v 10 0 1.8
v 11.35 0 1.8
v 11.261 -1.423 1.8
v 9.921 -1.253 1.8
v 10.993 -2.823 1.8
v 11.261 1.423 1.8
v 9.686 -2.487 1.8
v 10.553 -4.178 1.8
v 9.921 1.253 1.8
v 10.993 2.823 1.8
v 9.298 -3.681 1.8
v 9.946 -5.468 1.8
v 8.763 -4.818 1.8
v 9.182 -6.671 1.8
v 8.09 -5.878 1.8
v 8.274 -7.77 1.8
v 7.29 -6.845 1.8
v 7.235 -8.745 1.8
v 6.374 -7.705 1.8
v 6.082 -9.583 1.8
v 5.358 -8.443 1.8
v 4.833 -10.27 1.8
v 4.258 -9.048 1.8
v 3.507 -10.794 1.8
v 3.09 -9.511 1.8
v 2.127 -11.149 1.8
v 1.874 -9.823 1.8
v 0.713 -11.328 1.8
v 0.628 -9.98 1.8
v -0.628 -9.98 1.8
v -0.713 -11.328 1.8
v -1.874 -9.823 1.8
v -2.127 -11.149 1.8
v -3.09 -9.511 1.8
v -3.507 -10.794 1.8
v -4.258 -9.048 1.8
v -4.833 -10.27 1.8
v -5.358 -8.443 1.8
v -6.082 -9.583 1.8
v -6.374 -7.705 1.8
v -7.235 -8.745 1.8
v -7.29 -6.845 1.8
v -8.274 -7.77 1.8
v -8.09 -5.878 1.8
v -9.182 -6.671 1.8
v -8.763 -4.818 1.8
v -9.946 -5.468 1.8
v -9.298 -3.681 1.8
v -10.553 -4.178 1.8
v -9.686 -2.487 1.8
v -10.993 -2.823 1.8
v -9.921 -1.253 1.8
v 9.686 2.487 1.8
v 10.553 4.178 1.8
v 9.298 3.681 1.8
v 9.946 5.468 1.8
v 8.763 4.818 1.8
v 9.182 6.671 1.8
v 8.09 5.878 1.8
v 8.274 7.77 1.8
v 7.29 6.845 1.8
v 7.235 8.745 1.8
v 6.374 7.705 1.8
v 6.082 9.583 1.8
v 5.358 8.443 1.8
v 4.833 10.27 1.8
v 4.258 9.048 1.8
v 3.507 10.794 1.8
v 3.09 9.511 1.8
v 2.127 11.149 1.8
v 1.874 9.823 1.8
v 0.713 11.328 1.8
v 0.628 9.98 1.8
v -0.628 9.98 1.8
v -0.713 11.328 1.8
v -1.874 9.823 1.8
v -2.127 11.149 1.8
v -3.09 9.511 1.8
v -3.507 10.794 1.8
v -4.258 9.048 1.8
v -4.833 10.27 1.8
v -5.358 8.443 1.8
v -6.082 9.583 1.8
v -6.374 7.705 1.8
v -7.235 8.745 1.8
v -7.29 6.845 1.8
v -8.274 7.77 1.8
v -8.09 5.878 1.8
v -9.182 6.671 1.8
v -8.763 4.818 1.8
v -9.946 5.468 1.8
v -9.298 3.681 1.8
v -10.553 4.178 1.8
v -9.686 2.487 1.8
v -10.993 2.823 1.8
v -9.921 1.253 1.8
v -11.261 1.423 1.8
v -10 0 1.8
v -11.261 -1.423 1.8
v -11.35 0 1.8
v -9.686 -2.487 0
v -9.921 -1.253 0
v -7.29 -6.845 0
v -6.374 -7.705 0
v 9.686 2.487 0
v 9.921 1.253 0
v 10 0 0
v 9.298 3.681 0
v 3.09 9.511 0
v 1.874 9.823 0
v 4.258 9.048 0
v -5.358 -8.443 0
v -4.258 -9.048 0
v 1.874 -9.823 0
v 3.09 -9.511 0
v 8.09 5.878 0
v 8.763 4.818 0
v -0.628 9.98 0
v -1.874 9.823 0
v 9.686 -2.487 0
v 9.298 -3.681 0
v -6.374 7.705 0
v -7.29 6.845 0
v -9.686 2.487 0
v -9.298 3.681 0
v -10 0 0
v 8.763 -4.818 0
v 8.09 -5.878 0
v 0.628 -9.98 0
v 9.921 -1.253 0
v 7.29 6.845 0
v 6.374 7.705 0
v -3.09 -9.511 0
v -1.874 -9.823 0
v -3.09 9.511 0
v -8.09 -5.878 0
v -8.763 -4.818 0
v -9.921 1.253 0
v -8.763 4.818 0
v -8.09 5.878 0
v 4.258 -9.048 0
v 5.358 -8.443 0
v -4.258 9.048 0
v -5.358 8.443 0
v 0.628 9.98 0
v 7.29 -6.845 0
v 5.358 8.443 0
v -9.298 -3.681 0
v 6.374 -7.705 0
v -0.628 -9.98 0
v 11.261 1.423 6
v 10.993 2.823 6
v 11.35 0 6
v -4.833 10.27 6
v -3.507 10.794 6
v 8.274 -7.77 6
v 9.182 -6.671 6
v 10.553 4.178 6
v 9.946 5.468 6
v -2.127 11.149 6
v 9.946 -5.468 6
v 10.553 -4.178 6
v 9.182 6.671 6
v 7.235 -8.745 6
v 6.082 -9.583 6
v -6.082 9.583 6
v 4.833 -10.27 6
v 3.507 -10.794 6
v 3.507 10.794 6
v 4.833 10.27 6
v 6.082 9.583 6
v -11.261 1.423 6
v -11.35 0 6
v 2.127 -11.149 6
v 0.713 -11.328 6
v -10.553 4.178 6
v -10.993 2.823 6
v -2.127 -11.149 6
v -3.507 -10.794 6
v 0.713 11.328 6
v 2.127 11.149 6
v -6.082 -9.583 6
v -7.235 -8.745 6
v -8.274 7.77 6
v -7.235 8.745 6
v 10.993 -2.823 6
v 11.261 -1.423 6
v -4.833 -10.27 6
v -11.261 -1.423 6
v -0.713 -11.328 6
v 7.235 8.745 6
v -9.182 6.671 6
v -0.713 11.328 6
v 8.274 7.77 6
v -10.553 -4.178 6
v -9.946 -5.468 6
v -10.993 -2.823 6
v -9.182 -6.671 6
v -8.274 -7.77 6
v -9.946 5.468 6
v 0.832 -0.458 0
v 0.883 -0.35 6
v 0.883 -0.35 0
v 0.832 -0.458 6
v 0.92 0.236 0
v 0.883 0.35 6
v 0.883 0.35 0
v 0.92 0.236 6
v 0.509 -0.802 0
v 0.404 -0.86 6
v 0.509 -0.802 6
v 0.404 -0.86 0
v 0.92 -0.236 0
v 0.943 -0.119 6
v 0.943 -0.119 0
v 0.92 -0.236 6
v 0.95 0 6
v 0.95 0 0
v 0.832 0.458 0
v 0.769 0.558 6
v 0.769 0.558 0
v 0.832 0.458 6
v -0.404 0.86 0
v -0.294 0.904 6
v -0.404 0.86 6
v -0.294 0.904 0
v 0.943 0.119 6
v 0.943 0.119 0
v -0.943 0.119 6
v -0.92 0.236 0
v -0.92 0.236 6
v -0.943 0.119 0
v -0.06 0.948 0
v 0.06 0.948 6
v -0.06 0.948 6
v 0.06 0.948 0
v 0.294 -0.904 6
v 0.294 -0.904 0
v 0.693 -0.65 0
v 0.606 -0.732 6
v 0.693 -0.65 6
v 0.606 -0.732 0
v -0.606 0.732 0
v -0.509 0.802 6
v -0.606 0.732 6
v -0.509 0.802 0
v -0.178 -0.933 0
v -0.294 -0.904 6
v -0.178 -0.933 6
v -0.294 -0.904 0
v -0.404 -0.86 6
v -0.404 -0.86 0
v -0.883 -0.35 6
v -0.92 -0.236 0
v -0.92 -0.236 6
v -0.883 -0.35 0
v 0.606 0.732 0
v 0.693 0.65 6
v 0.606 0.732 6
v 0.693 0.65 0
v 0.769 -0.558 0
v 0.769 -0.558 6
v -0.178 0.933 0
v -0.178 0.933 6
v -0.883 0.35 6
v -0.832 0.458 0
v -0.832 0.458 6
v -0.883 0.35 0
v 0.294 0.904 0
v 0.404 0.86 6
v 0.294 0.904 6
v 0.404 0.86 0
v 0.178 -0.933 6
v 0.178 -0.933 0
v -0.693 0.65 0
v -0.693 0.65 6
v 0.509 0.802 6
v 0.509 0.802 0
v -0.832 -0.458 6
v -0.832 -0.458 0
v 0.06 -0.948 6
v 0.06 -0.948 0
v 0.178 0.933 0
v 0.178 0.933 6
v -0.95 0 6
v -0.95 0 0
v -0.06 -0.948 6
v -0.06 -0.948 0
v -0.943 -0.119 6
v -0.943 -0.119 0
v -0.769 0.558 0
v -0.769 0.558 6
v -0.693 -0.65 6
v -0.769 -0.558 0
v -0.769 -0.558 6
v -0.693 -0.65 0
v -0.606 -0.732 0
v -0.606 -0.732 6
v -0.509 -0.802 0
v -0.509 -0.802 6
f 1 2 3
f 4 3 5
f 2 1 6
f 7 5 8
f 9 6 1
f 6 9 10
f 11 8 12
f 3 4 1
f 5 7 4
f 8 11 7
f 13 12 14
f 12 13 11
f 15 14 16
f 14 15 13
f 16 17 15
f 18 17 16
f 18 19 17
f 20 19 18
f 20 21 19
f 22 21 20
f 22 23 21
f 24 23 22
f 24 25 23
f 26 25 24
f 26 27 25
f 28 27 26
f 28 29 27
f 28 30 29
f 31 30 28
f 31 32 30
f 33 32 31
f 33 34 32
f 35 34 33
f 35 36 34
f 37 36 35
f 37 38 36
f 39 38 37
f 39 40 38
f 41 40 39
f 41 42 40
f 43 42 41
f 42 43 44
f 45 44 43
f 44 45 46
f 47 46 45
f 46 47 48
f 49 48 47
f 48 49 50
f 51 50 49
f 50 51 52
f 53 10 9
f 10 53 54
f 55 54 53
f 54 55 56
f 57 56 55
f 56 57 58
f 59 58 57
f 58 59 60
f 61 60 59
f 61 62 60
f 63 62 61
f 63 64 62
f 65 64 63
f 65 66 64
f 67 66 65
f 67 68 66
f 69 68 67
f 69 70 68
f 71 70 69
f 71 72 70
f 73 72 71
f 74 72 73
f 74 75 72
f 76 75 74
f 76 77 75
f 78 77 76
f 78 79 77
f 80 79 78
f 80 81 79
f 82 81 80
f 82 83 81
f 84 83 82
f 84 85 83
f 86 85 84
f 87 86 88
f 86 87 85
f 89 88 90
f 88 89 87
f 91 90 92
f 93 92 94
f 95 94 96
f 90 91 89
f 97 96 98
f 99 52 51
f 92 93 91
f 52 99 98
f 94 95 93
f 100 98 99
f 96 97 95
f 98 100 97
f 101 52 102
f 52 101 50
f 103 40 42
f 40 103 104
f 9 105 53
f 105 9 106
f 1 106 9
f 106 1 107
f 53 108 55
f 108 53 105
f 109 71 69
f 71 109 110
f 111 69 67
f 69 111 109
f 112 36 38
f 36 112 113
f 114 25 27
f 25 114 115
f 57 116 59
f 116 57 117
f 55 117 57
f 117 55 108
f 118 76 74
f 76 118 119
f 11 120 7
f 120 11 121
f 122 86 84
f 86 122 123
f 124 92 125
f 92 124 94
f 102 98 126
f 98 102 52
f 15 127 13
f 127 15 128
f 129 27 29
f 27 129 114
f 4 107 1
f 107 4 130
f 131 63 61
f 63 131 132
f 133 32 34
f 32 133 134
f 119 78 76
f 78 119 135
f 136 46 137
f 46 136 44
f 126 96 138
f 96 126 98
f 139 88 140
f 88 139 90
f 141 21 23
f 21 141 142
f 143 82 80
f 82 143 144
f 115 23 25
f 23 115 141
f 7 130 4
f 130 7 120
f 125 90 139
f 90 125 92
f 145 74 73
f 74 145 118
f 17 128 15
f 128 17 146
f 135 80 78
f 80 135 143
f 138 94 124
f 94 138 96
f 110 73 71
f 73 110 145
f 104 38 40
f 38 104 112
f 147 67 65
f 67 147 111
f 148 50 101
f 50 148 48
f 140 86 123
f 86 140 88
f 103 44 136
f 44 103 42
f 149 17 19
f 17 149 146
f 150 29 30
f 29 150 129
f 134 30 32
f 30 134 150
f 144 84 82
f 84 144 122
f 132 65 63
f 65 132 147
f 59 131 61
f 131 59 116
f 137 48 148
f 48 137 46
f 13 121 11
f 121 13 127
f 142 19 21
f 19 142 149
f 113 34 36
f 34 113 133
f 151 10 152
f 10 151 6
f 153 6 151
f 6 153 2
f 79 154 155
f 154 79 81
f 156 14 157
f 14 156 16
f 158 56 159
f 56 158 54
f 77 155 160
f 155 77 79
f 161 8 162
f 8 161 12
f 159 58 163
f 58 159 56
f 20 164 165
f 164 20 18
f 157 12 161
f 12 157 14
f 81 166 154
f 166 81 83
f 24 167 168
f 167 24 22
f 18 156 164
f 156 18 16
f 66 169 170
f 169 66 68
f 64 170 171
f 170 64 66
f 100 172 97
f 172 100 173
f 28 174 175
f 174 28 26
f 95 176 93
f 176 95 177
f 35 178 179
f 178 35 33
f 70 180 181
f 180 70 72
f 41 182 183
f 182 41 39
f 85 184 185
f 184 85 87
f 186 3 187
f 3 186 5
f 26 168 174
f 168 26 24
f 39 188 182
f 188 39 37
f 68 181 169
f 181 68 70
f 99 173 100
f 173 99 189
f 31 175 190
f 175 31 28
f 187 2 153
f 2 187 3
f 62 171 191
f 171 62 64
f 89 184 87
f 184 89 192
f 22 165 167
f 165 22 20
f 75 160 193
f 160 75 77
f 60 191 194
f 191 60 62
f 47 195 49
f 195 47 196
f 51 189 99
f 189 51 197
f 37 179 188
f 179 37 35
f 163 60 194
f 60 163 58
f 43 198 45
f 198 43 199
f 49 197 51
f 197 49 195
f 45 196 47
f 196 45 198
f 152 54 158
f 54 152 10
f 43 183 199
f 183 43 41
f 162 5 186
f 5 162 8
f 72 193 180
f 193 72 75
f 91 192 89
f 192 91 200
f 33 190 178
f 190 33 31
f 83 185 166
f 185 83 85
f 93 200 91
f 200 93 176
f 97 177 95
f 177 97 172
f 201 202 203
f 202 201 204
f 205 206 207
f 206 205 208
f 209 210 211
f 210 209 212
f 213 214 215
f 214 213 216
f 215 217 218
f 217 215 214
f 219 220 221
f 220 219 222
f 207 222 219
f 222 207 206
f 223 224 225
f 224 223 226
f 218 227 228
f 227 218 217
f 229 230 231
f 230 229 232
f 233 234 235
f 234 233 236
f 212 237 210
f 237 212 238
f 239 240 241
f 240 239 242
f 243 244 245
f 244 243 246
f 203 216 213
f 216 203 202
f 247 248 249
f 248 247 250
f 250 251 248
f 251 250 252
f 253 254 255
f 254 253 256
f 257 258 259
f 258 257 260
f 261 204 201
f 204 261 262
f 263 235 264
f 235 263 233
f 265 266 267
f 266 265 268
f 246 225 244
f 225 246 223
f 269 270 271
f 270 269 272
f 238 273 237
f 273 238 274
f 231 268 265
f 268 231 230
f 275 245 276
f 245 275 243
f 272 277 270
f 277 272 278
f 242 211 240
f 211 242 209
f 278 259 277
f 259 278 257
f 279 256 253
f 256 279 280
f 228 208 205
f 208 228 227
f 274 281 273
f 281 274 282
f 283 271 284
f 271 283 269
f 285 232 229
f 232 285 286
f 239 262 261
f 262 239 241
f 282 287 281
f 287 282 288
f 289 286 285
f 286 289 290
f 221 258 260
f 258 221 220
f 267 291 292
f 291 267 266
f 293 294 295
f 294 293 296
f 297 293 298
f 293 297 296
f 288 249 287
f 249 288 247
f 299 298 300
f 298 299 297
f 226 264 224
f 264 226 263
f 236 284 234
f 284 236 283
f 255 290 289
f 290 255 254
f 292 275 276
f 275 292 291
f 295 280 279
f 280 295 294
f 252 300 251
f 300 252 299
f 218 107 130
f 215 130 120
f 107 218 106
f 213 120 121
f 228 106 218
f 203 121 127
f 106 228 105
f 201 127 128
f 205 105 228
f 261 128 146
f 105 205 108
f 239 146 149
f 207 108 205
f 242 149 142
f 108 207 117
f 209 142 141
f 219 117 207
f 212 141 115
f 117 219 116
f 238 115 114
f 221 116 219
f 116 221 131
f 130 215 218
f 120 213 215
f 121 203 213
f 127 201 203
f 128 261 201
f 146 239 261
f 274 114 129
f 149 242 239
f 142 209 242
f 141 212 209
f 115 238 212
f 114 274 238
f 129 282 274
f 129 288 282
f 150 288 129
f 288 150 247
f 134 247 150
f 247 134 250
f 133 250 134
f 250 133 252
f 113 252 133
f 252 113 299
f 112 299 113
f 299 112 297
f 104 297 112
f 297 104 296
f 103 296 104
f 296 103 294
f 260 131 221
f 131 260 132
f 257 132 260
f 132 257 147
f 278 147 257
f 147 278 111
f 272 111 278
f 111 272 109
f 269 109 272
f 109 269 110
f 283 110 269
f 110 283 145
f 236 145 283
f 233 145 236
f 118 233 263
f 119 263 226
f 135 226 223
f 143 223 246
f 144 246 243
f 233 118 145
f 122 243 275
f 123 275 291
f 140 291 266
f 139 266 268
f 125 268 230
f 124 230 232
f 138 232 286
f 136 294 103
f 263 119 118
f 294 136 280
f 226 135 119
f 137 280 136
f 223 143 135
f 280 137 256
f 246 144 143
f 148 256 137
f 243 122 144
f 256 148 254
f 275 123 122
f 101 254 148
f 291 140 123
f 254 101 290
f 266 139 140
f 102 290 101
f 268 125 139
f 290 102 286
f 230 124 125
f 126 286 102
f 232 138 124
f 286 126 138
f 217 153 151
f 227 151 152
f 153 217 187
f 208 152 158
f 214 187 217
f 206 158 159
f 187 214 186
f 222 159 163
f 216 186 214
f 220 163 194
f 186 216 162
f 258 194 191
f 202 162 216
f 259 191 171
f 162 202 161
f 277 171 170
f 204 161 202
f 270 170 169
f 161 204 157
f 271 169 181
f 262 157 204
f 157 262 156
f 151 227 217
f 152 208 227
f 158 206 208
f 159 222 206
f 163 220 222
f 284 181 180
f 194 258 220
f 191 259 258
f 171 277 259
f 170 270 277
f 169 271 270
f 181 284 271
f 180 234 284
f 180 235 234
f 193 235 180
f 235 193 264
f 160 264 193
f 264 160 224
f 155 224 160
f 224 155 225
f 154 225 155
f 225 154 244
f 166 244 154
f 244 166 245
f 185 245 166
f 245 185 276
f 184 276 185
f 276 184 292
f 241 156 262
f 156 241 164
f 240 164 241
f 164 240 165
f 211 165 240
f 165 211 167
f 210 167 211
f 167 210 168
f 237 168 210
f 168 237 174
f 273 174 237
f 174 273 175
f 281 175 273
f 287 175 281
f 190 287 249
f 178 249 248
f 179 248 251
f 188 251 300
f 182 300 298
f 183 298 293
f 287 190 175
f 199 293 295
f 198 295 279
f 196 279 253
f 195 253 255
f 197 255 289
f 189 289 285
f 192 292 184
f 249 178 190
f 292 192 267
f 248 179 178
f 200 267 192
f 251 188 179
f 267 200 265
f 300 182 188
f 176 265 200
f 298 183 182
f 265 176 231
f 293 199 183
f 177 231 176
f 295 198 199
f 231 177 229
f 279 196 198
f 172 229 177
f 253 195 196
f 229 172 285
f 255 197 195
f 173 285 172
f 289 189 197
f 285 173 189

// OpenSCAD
$fn = 50;


difference() {
	union() {
		*color(alpha = 1.0000000000, c = "gray") {
			translate(v = [0, 7, 0]) {
				linear_extrude(height = 12) {
					text(font = "Arial:style=Bold", halign = "center", size = 4.5000000000, text = "COMMENT bearing_plate_plate", valign = "center");
				}
			}
		}
		*color(alpha = 1.0000000000, c = "gray") {
			translate(v = [0, 14, 0]) {
				linear_extrude(height = 12) {
					text(font = "Arial:style=Bold", halign = "center", size = 4.5000000000, text = "COMMENT description oobb_cylinder_shape_p_type_12_depth_3_width_12_height_12_thickness_motor_n20_shaft_p_t_12.0_radius_all_mode", valign = "center");
				}
			}
		}
		translate(v = [0, 0, -6.0000000000]) {
			cylinder(h = 12, r = 12.0000000000);
		}
		*color(alpha = 1.0000000000, c = "gray") {
			translate(v = [0, 7, 0]) {
				linear_extrude(height = 1) {
					text(font = "Arial:style=Bold", halign = "center", size = 4.5000000000, text = "COMMENT bearing_plate_slice", valign = "center");
				}
			}
		}
	}
	union() {
		translate(v = [18.0000000000, 0, -6.0000000000]) {
			rotate(a = [0, 180, 30.0000000000]) {
				difference() {
					union() {
						translate(v = [0, 0, -12.0000000000]) {
							cylinder(h = 12, r = 1.5000000000);
						}
						translate(v = [0, 0, -12.0000000000]) {
							linear_extrude(height = 2.5000000000) {
								polygon(points = [[3.4620000000, 0.0000000000], [1.7310000000, 2.9981799479], [-1.7310000000, 2.9981799479], [-3.4620000000, 0.0000000000], [-1.7310000000, -2.9981799479], [1.7310000000, -2.9981799479]]);
							}
						}
						translate(v = [-1.7500000000, -3.2500000000, -9.5000000000]) {
							cube(size = [3.5000000000, 6.5000000000, 0.3000000000]);
						}
						translate(v = [-1.7500000000, -1.7500000000, -9.2000000000]) {
							cube(size = [3.5000000000, 3.5000000000, 0.3000000000]);
						}
						translate(v = [-1.7500000000, -3.2500000000, -12.3000000000]) {
							cube(size = [3.5000000000, 6.5000000000, 0.3000000000]);
						}
						translate(v = [-1.7500000000, -1.7500000000, -12.6000000000]) {
							cube(size = [3.5000000000, 3.5000000000, 0.3000000000]);
						}
						translate(v = [0, 0, -0.9500000000]) {
							cylinder(r1 = 1.8000000000, r2 = 3.6000000000);
						}
						translate(v = [0, 0, -12.0000000000]) {
							cylinder(h = 12, r = 1.8000000000);
						}
						translate(v = [0, 0, -12.0000000000]) {
							linear_extrude(height = 2.5000000000) {
								polygon(points = [[3.4620000000, 0.0000000000], [1.7310000000, 2.9981799479], [-1.7310000000, 2.9981799479], [-3.4620000000, 0.0000000000], [-1.7310000000, -2.9981799479], [1.7310000000, -2.9981799479]]);
							}
						}
						translate(v = [-1.7500000000, -3.2500000000, -9.5000000000]) {
							cube(size = [3.5000000000, 6.5000000000, 0.3000000000]);
						}
						translate(v = [-1.7500000000, -1.7500000000, -9.2000000000]) {
							cube(size = [3.5000000000, 3.5000000000, 0.3000000000]);
						}
						translate(v = [-1.7500000000, -3.2500000000, -12.3000000000]) {
							cube(size = [3.5000000000, 6.5000000000, 0.3000000000]);
						}
						translate(v = [-1.7500000000, -1.7500000000, -12.6000000000]) {
							cube(size = [3.5000000000, 3.5000000000, 0.3000000000]);
						}
						translate(v = [0, 0, -12.0000000000]) {
							cylinder(h = 12, r = 1.5000000000);
						}
						translate(v = [0, 0, -12.0000000000]) {
							linear_extrude(height = 2.5000000000) {
								polygon(points = [[3.4620000000, 0.0000000000], [1.7310000000, 2.9981799479], [-1.7310000000, 2.9981799479], [-3.4620000000, 0.0000000000], [-1.7310000000, -2.9981799479], [1.7310000000, -2.9981799479]]);
							}
						}
						translate(v = [-1.7500000000, -3.2500000000, -9.5000000000]) {
							cube(size = [3.5000000000, 6.5000000000, 0.3000000000]);
						}
						translate(v = [-1.7500000000, -1.7500000000, -9.2000000000]) {
							cube(size = [3.5000000000, 3.5000000000, 0.3000000000]);
						}
						translate(v = [-1.7500000000, -3.2500000000, -12.3000000000]) {
							cube(size = [3.5000000000, 6.5000000000, 0.3000000000]);
						}
						translate(v = [-1.7500000000, -1.7500000000, -12.6000000000]) {
							cube(size = [3.5000000000, 3.5000000000, 0.3000000000]);
						}
					}
					union();
				}
			}
		}
		translate(v = [-18.0000000000, 0, -6.0000000000]) {
			rotate(a = [0, 180, 30.0000000000]) {
				difference() {
					union() {
						translate(v = [0, 0, -12.0000000000]) {
							cylinder(h = 12, r = 1.5000000000);
						}
						translate(v = [0, 0, -12.0000000000]) {
							linear_extrude(height = 2.5000000000) {
								polygon(points = [[3.4620000000, 0.0000000000], [1.7310000000, 2.9981799479], [-1.7310000000, 2.9981799479], [-3.4620000000, 0.0000000000], [-1.7310000000, -2.9981799479], [1.7310000000, -2.9981799479]]);
							}
						}
						translate(v = [-1.7500000000, -3.2500000000, -9.5000000000]) {
							cube(size = [3.5000000000, 6.5000000000, 0.3000000000]);
						}
						translate(v = [-1.7500000000, -1.7500000000, -9.2000000000]) {
							cube(size = [3.5000000000, 3.5000000000, 0.3000000000]);
						}
						translate(v = [-1.7500000000, -3.2500000000, -12.3000000000]) {
							cube(size = [3.5000000000, 6.5000000000, 0.3000000000]);
						}
						translate(v = [-1.7500000000, -1.7500000000, -12.6000000000]) {
							cube(size = [3.5000000000, 3.5000000000, 0.3000000000]);
						}
						translate(v = [0, 0, -0.9500000000]) {
							cylinder(r1 = 1.8000000000, r2 = 3.6000000000);
						}
						translate(v = [0, 0, -12.0000000000]) {
							cylinder(h = 12, r = 1.8000000000);
						}
						translate(v = [0, 0, -12.0000000000]) {
							linear_extrude(height = 2.5000000000) {
								polygon(points = [[3.4620000000, 0.0000000000], [1.7310000000, 2.9981799479], [-1.7310000000, 2.9981799479], [-3.4620000000, 0.0000000000], [-1.7310000000, -2.9981799479], [1.7310000000, -2.9981799479]]);
							}
						}
						translate(v = [-1.7500000000, -3.2500000000, -9.5000000000]) {
							cube(size = [3.5000000000, 6.5000000000, 0.3000000000]);
						}
						translate(v = [-1.7500000000, -1.7500000000, -9.2000000000]) {
							cube(size = [3.5000000000, 3.5000000000, 0.3000000000]);
						}
						translate(v = [-1.7500000000, -3.2500000000, -12.3000000000]) {
							cube(size = [3.5000000000, 6.5000000000, 0.3000000000]);
						}
						translate(v = [-1.7500000000, -1.7500000000, -12.6000000000]) {
							cube(size = [3.5000000000, 3.5000000000, 0.3000000000]);
						}
						translate(v = [0, 0, -12.0000000000]) {
							cylinder(h = 12, r = 1.5000000000);
						}
						translate(v = [0, 0, -12.0000000000]) {
							linear_extrude(height = 2.5000000000) {
								polygon(points = [[3.4620000000, 0.0000000000], [1.7310000000, 2.9981799479], [-1.7310000000, 2.9981799479], [-3.4620000000, 0.0000000000], [-1.7310000000, -2.9981799479], [1.7310000000, -2.9981799479]]);
							}
						}
						translate(v = [-1.7500000000, -3.2500000000, -9.5000000000]) {
							cube(size = [3.5000000000, 6.5000000000, 0.3000000000]);
						}
						translate(v = [-1.7500000000, -1.7500000000, -9.2000000000]) {
							cube(size = [3.5000000000, 3.5000000000, 0.3000000000]);
						}
						translate(v = [-1.7500000000, -3.2500000000, -12.3000000000]) {
							cube(size = [3.5000000000, 6.5000000000, 0.3000000000]);
						}
						translate(v = [-1.7500000000, -1.7500000000, -12.6000000000]) {
							cube(size = [3.5000000000, 3.5000000000, 0.3000000000]);
						}
					}
					union();
				}
			}
		}
		translate(v = [0, 18.0000000000, 6.0000000000]) {
			rotate(a = [0, 0, 0]) {
				difference() {
					union() {
						translate(v = [0, 0, -12.0000000000]) {
							cylinder(h = 12, r = 1.5000000000);
						}
						translate(v = [0, 0, -12.0000000000]) {
							linear_extrude(height = 2.5000000000) {
								polygon(points = [[3.4620000000, 0.0000000000], [1.7310000000, 2.9981799479], [-1.7310000000, 2.9981799479], [-3.4620000000, 0.0000000000], [-1.7310000000, -2.9981799479], [1.7310000000, -2.9981799479]]);
							}
						}
						translate(v = [-1.7500000000, -3.2500000000, -9.5000000000]) {
							cube(size = [3.5000000000, 6.5000000000, 0.3000000000]);
						}
						translate(v = [-1.7500000000, -1.7500000000, -9.2000000000]) {
							cube(size = [3.5000000000, 3.5000000000, 0.3000000000]);
						}
						translate(v = [-1.7500000000, -3.2500000000, -12.3000000000]) {
							cube(size = [3.5000000000, 6.5000000000, 0.3000000000]);
						}
						translate(v = [-1.7500000000, -1.7500000000, -12.6000000000]) {
							cube(size = [3.5000000000, 3.5000000000, 0.3000000000]);
						}
						translate(v = [0, 0, -0.9500000000]) {
							cylinder(r1 = 1.8000000000, r2 = 3.6000000000);
						}
						translate(v = [0, 0, -12.0000000000]) {
							cylinder(h = 12, r = 1.8000000000);
						}
						translate(v = [0, 0, -12.0000000000]) {
							linear_extrude(height = 2.5000000000) {
								polygon(points = [[3.4620000000, 0.0000000000], [1.7310000000, 2.9981799479], [-1.7310000000, 2.9981799479], [-3.4620000000, 0.0000000000], [-1.7310000000, -2.9981799479], [1.7310000000, -2.9981799479]]);
							}
						}
						translate(v = [-1.7500000000, -3.2500000000, -9.5000000000]) {
							cube(size = [3.5000000000, 6.5000000000, 0.3000000000]);
						}
						translate(v = [-1.7500000000, -1.7500000000, -9.2000000000]) {
							cube(size = [3.5000000000, 3.5000000000, 0.3000000000]);
						}
						translate(v = [-1.7500000000, -3.2500000000, -12.3000000000]) {
							cube(size = [3.5000000000, 6.5000000000, 0.3000000000]);
						}
						translate(v = [-1.7500000000, -1.7500000000, -12.6000000000]) {
							cube(size = [3.5000000000, 3.5000000000, 0.3000000000]);
						}
						translate(v = [0, 0, -12.0000000000]) {
							cylinder(h = 12, r = 1.5000000000);
						}
						translate(v = [0, 0, -12.0000000000]) {
							linear_extrude(height = 2.5000000000) {
								polygon(points = [[3.4620000000, 0.0000000000], [1.7310000000, 2.9981799479], [-1.7310000000, 2.9981799479], [-3.4620000000, 0.0000000000], [-1.7310000000, -2.9981799479], [1.7310000000, -2.9981799479]]);
							}
						}
						translate(v = [-1.7500000000, -3.2500000000, -9.5000000000]) {
							cube(size = [3.5000000000, 6.5000000000, 0.3000000000]);
						}
						translate(v = [-1.7500000000, -1.7500000000, -9.2000000000]) {
							cube(size = [3.5000000000, 3.5000000000, 0.3000000000]);
						}
						translate(v = [-1.7500000000, -3.2500000000, -12.3000000000]) {
							cube(size = [3.5000000000, 6.5000000000, 0.3000000000]);
						}
						translate(v = [-1.7500000000, -1.7500000000, -12.6000000000]) {
							cube(size = [3.5000000000, 3.5000000000, 0.3000000000]);
						}
					}
					union();
				}
			}
		}
		translate(v = [0, -18.0000000000, 6.0000000000]) {
			rotate(a = [0, 0, 0]) {
				difference() {
					union() {
						translate(v = [0, 0, -12.0000000000]) {
							cylinder(h = 12, r = 1.5000000000);
						}
						translate(v = [0, 0, -12.0000000000]) {
							linear_extrude(height = 2.5000000000) {
								polygon(points = [[3.4620000000, 0.0000000000], [1.7310000000, 2.9981799479], [-1.7310000000, 2.9981799479], [-3.4620000000, 0.0000000000], [-1.7310000000, -2.9981799479], [1.7310000000, -2.9981799479]]);
							}
						}
						translate(v = [-1.7500000000, -3.2500000000, -9.5000000000]) {
							cube(size = [3.5000000000, 6.5000000000, 0.3000000000]);
						}
						translate(v = [-1.7500000000, -1.7500000000, -9.2000000000]) {
							cube(size = [3.5000000000, 3.5000000000, 0.3000000000]);
						}
						translate(v = [-1.7500000000, -3.2500000000, -12.3000000000]) {
							cube(size = [3.5000000000, 6.5000000000, 0.3000000000]);
						}
						translate(v = [-1.7500000000, -1.7500000000, -12.6000000000]) {
							cube(size = [3.5000000000, 3.5000000000, 0.3000000000]);
						}
						translate(v = [0, 0, -0.9500000000]) {
							cylinder(r1 = 1.8000000000, r2 = 3.6000000000);
						}
						translate(v = [0, 0, -12.0000000000]) {
							cylinder(h = 12, r = 1.8000000000);
						}
						translate(v = [0, 0, -12.0000000000]) {
							linear_extrude(height = 2.5000000000) {
								polygon(points = [[3.4620000000, 0.0000000000], [1.7310000000, 2.9981799479], [-1.7310000000, 2.9981799479], [-3.4620000000, 0.0000000000], [-1.7310000000, -2.9981799479], [1.7310000000, -2.9981799479]]);
							}
						}
						translate(v = [-1.7500000000, -3.2500000000, -9.5000000000]) {
							cube(size = [3.5000000000, 6.5000000000, 0.3000000000]);
						}
						translate(v = [-1.7500000000, -1.7500000000, -9.2000000000]) {
							cube(size = [3.5000000000, 3.5000000000, 0.3000000000]);
						}
						translate(v = [-1.7500000000, -3.2500000000, -12.3000000000]) {
							cube(size = [3.5000000000, 6.5000000000, 0.3000000000]);
						}
						translate(v = [-1.7500000000, -1.7500000000, -12.6000000000]) {
							cube(size = [3.5000000000, 3.5000000000, 0.3000000000]);
						}
						translate(v = [0, 0, -12.0000000000]) {
							cylinder(h = 12, r = 1.5000000000);
						}
						translate(v = [0, 0, -12.0000000000]) {
							linear_extrude(height = 2.5000000000) {
								polygon(points = [[3.4620000000, 0.0000000000], [1.7310000000, 2.9981799479], [-1.7310000000, 2.9981799479], [-3.4620000000, 0.0000000000], [-1.7310000000, -2.9981799479], [1.7310000000, -2.9981799479]]);
							}
						}
						translate(v = [-1.7500000000, -3.2500000000, -9.5000000000]) {
							cube(size = [3.5000000000, 6.5000000000, 0.3000000000]);
						}
						translate(v = [-1.7500000000, -1.7500000000, -9.2000000000]) {
							cube(size = [3.5000000000, 3.5000000000, 0.3000000000]);
						}
						translate(v = [-1.7500000000, -3.2500000000, -12.3000000000]) {
							cube(size = [3.5000000000, 6.5000000000, 0.3000000000]);
						}
						translate(v = [-1.7500000000, -1.7500000000, -12.6000000000]) {
							cube(size = [3.5000000000, 3.5000000000, 0.3000000000]);
						}
					}
					union();
				}
			}
		}
		*color(alpha = 1.0000000000, c = "gray") {
			translate(v = [0, 14, 0]) {
				linear_extrude(height = 3) {
					text(font = "Arial:style=Bold", halign = "center", size = 4.5000000000, text = "COMMENT description oobb_bearing_shape_n_type_12_depth_3_width_3_height_12_thickness_motor_n20_shaft_6704_bearing", valign = "center");
				}
			}
		}
		translate(v = [0, 0, -1.8000000000]) {
			union() {
				difference() {
					cylinder(h = 3.6000000000, r = 13.7000000000);
					cylinder(h = 3.6000000000, r = 10.0000000000);
				}
				difference() {
					translate(v = [0, 0, -50]) {
						cylinder(h = 100, r = 12.3500000000);
					}
					translate(v = [0, 0, -50]) {
						cylinder(h = 100, r = 11.3500000000);
					}
				}
			}
		}
		*color(alpha = 1.0000000000, c = "gray") {
			translate(v = [0, 14, 0]) {
				linear_extrude(height = 3) {
					text(font = "Arial:style=Bold", halign = "center", size = 4.5000000000, text = "COMMENT description oobb_holes_shape_n_type_m6_radius_name_3_width_3_height_12_thickness_motor_n20_shaft_perimeter_miss_middle_holes", valign = "center");
				}
			}
		}
		translate(v = [-15.0000000000, -15.0000000000, -50.0000000000]) {
			cylinder(h = 100, r = 3.2500000000);
		}
		translate(v = [-15.0000000000, 15.0000000000, -50.0000000000]) {
			cylinder(h = 100, r = 3.2500000000);
		}
		translate(v = [15.0000000000, -15.0000000000, -50.0000000000]) {
			cylinder(h = 100, r = 3.2500000000);
		}
		translate(v = [15.0000000000, 15.0000000000, -50.0000000000]) {
			cylinder(h = 100, r = 3.2500000000);
		}
		*color(alpha = 1.0000000000, c = "gray") {
			translate(v = [0, 14, 0]) {
				linear_extrude(height = 3) {
					text(font = "Arial:style=Bold", halign = "center", size = 4.5000000000, text = "COMMENT description oobb_motor_n20_shape_n_type_3_width_3_height_12_thickness_motor_n20_shaft_shaft_part", valign = "center");
				}
			}
		}
		translate(v = [0, 0, 125]) {
			difference() {
				#translate(v = [0, 0, -250]) {
					cylinder(h = 250, r = 0.9500000000);
				}
				#translate(v = [0, -0.8000000000, -250]) {
					cube(size = [1.9000000000, -0.8000000000, 250]);
				}
			}
		}
		*color(alpha = 1.0000000000, c = "gray") {
			translate(v = [18.0000000000, 14, -6.0000000000]) {
				rotate(a = [0, 180, 30.0000000000]) {
					linear_extrude(height = 3) {
						text(font = "Arial:style=Bold", halign = "center", size = 4.5000000000, text = "COMMENT description oobb_screw_countersunk_shape_n_type_m3_radius_name_12_depth_18.0_0_-6.0_pos_3_width_3_height_12_thickness_motor_n20_shaft_0_180_30.0_rot_true_nut_true_overhang", valign = "center");
					}
				}
			}
		}
		*color(alpha = 1.0000000000, c = "gray") {
			translate(v = [-18.0000000000, 14, -6.0000000000]) {
				rotate(a = [0, 180, 30.0000000000]) {
					linear_extrude(height = 3) {
						text(font = "Arial:style=Bold", halign = "center", size = 4.5000000000, text = "COMMENT description oobb_screw_countersunk_shape_n_type_m3_radius_name_12_depth_-18.0_0_-6.0_pos_3_width_3_height_12_thickness_motor_n20_shaft_0_180_30.0_rot_true_nut_true_overhang", valign = "center");
					}
				}
			}
		}
		*color(alpha = 1.0000000000, c = "gray") {
			translate(v = [0, 32.0000000000, 6.0000000000]) {
				linear_extrude(height = 3) {
					text(font = "Arial:style=Bold", halign = "center", size = 4.5000000000, text = "COMMENT description oobb_screw_countersunk_shape_n_type_m3_radius_name_12_depth_0_18.0_6.0_pos_3_width_3_height_12_thickness_motor_n20_shaft_0_0_0_rot_true_nut_true_overhang", valign = "center");
				}
			}
		}
		*color(alpha = 1.0000000000, c = "gray") {
			translate(v = [0, -4.0000000000, 6.0000000000]) {
				linear_extrude(height = 3) {
					text(font = "Arial:style=Bold", halign = "center", size = 4.5000000000, text = "COMMENT description oobb_screw_countersunk_shape_n_type_m3_radius_name_12_depth_0_-18.0_6.0_pos_3_width_3_height_12_thickness_motor_n20_shaft_0_0_0_rot_true_nut_true_overhang", valign = "center");
				}
			}
		}
		*color(alpha = 1.0000000000, c = "gray") {
			translate(v = [0, 14, 0]) {
				linear_extrude(height = 1) {
					text(font = "Arial:style=Bold", halign = "center", size = 4.5000000000, text = "COMMENT description oobb_slice_shape_n_type_3dpr_mode_top_zz", valign = "center");
				}
			}
		}
		translate(v = [-250, -250, -500]) {
			cube(size = [500, 500, 500]);
		}
	}
}
